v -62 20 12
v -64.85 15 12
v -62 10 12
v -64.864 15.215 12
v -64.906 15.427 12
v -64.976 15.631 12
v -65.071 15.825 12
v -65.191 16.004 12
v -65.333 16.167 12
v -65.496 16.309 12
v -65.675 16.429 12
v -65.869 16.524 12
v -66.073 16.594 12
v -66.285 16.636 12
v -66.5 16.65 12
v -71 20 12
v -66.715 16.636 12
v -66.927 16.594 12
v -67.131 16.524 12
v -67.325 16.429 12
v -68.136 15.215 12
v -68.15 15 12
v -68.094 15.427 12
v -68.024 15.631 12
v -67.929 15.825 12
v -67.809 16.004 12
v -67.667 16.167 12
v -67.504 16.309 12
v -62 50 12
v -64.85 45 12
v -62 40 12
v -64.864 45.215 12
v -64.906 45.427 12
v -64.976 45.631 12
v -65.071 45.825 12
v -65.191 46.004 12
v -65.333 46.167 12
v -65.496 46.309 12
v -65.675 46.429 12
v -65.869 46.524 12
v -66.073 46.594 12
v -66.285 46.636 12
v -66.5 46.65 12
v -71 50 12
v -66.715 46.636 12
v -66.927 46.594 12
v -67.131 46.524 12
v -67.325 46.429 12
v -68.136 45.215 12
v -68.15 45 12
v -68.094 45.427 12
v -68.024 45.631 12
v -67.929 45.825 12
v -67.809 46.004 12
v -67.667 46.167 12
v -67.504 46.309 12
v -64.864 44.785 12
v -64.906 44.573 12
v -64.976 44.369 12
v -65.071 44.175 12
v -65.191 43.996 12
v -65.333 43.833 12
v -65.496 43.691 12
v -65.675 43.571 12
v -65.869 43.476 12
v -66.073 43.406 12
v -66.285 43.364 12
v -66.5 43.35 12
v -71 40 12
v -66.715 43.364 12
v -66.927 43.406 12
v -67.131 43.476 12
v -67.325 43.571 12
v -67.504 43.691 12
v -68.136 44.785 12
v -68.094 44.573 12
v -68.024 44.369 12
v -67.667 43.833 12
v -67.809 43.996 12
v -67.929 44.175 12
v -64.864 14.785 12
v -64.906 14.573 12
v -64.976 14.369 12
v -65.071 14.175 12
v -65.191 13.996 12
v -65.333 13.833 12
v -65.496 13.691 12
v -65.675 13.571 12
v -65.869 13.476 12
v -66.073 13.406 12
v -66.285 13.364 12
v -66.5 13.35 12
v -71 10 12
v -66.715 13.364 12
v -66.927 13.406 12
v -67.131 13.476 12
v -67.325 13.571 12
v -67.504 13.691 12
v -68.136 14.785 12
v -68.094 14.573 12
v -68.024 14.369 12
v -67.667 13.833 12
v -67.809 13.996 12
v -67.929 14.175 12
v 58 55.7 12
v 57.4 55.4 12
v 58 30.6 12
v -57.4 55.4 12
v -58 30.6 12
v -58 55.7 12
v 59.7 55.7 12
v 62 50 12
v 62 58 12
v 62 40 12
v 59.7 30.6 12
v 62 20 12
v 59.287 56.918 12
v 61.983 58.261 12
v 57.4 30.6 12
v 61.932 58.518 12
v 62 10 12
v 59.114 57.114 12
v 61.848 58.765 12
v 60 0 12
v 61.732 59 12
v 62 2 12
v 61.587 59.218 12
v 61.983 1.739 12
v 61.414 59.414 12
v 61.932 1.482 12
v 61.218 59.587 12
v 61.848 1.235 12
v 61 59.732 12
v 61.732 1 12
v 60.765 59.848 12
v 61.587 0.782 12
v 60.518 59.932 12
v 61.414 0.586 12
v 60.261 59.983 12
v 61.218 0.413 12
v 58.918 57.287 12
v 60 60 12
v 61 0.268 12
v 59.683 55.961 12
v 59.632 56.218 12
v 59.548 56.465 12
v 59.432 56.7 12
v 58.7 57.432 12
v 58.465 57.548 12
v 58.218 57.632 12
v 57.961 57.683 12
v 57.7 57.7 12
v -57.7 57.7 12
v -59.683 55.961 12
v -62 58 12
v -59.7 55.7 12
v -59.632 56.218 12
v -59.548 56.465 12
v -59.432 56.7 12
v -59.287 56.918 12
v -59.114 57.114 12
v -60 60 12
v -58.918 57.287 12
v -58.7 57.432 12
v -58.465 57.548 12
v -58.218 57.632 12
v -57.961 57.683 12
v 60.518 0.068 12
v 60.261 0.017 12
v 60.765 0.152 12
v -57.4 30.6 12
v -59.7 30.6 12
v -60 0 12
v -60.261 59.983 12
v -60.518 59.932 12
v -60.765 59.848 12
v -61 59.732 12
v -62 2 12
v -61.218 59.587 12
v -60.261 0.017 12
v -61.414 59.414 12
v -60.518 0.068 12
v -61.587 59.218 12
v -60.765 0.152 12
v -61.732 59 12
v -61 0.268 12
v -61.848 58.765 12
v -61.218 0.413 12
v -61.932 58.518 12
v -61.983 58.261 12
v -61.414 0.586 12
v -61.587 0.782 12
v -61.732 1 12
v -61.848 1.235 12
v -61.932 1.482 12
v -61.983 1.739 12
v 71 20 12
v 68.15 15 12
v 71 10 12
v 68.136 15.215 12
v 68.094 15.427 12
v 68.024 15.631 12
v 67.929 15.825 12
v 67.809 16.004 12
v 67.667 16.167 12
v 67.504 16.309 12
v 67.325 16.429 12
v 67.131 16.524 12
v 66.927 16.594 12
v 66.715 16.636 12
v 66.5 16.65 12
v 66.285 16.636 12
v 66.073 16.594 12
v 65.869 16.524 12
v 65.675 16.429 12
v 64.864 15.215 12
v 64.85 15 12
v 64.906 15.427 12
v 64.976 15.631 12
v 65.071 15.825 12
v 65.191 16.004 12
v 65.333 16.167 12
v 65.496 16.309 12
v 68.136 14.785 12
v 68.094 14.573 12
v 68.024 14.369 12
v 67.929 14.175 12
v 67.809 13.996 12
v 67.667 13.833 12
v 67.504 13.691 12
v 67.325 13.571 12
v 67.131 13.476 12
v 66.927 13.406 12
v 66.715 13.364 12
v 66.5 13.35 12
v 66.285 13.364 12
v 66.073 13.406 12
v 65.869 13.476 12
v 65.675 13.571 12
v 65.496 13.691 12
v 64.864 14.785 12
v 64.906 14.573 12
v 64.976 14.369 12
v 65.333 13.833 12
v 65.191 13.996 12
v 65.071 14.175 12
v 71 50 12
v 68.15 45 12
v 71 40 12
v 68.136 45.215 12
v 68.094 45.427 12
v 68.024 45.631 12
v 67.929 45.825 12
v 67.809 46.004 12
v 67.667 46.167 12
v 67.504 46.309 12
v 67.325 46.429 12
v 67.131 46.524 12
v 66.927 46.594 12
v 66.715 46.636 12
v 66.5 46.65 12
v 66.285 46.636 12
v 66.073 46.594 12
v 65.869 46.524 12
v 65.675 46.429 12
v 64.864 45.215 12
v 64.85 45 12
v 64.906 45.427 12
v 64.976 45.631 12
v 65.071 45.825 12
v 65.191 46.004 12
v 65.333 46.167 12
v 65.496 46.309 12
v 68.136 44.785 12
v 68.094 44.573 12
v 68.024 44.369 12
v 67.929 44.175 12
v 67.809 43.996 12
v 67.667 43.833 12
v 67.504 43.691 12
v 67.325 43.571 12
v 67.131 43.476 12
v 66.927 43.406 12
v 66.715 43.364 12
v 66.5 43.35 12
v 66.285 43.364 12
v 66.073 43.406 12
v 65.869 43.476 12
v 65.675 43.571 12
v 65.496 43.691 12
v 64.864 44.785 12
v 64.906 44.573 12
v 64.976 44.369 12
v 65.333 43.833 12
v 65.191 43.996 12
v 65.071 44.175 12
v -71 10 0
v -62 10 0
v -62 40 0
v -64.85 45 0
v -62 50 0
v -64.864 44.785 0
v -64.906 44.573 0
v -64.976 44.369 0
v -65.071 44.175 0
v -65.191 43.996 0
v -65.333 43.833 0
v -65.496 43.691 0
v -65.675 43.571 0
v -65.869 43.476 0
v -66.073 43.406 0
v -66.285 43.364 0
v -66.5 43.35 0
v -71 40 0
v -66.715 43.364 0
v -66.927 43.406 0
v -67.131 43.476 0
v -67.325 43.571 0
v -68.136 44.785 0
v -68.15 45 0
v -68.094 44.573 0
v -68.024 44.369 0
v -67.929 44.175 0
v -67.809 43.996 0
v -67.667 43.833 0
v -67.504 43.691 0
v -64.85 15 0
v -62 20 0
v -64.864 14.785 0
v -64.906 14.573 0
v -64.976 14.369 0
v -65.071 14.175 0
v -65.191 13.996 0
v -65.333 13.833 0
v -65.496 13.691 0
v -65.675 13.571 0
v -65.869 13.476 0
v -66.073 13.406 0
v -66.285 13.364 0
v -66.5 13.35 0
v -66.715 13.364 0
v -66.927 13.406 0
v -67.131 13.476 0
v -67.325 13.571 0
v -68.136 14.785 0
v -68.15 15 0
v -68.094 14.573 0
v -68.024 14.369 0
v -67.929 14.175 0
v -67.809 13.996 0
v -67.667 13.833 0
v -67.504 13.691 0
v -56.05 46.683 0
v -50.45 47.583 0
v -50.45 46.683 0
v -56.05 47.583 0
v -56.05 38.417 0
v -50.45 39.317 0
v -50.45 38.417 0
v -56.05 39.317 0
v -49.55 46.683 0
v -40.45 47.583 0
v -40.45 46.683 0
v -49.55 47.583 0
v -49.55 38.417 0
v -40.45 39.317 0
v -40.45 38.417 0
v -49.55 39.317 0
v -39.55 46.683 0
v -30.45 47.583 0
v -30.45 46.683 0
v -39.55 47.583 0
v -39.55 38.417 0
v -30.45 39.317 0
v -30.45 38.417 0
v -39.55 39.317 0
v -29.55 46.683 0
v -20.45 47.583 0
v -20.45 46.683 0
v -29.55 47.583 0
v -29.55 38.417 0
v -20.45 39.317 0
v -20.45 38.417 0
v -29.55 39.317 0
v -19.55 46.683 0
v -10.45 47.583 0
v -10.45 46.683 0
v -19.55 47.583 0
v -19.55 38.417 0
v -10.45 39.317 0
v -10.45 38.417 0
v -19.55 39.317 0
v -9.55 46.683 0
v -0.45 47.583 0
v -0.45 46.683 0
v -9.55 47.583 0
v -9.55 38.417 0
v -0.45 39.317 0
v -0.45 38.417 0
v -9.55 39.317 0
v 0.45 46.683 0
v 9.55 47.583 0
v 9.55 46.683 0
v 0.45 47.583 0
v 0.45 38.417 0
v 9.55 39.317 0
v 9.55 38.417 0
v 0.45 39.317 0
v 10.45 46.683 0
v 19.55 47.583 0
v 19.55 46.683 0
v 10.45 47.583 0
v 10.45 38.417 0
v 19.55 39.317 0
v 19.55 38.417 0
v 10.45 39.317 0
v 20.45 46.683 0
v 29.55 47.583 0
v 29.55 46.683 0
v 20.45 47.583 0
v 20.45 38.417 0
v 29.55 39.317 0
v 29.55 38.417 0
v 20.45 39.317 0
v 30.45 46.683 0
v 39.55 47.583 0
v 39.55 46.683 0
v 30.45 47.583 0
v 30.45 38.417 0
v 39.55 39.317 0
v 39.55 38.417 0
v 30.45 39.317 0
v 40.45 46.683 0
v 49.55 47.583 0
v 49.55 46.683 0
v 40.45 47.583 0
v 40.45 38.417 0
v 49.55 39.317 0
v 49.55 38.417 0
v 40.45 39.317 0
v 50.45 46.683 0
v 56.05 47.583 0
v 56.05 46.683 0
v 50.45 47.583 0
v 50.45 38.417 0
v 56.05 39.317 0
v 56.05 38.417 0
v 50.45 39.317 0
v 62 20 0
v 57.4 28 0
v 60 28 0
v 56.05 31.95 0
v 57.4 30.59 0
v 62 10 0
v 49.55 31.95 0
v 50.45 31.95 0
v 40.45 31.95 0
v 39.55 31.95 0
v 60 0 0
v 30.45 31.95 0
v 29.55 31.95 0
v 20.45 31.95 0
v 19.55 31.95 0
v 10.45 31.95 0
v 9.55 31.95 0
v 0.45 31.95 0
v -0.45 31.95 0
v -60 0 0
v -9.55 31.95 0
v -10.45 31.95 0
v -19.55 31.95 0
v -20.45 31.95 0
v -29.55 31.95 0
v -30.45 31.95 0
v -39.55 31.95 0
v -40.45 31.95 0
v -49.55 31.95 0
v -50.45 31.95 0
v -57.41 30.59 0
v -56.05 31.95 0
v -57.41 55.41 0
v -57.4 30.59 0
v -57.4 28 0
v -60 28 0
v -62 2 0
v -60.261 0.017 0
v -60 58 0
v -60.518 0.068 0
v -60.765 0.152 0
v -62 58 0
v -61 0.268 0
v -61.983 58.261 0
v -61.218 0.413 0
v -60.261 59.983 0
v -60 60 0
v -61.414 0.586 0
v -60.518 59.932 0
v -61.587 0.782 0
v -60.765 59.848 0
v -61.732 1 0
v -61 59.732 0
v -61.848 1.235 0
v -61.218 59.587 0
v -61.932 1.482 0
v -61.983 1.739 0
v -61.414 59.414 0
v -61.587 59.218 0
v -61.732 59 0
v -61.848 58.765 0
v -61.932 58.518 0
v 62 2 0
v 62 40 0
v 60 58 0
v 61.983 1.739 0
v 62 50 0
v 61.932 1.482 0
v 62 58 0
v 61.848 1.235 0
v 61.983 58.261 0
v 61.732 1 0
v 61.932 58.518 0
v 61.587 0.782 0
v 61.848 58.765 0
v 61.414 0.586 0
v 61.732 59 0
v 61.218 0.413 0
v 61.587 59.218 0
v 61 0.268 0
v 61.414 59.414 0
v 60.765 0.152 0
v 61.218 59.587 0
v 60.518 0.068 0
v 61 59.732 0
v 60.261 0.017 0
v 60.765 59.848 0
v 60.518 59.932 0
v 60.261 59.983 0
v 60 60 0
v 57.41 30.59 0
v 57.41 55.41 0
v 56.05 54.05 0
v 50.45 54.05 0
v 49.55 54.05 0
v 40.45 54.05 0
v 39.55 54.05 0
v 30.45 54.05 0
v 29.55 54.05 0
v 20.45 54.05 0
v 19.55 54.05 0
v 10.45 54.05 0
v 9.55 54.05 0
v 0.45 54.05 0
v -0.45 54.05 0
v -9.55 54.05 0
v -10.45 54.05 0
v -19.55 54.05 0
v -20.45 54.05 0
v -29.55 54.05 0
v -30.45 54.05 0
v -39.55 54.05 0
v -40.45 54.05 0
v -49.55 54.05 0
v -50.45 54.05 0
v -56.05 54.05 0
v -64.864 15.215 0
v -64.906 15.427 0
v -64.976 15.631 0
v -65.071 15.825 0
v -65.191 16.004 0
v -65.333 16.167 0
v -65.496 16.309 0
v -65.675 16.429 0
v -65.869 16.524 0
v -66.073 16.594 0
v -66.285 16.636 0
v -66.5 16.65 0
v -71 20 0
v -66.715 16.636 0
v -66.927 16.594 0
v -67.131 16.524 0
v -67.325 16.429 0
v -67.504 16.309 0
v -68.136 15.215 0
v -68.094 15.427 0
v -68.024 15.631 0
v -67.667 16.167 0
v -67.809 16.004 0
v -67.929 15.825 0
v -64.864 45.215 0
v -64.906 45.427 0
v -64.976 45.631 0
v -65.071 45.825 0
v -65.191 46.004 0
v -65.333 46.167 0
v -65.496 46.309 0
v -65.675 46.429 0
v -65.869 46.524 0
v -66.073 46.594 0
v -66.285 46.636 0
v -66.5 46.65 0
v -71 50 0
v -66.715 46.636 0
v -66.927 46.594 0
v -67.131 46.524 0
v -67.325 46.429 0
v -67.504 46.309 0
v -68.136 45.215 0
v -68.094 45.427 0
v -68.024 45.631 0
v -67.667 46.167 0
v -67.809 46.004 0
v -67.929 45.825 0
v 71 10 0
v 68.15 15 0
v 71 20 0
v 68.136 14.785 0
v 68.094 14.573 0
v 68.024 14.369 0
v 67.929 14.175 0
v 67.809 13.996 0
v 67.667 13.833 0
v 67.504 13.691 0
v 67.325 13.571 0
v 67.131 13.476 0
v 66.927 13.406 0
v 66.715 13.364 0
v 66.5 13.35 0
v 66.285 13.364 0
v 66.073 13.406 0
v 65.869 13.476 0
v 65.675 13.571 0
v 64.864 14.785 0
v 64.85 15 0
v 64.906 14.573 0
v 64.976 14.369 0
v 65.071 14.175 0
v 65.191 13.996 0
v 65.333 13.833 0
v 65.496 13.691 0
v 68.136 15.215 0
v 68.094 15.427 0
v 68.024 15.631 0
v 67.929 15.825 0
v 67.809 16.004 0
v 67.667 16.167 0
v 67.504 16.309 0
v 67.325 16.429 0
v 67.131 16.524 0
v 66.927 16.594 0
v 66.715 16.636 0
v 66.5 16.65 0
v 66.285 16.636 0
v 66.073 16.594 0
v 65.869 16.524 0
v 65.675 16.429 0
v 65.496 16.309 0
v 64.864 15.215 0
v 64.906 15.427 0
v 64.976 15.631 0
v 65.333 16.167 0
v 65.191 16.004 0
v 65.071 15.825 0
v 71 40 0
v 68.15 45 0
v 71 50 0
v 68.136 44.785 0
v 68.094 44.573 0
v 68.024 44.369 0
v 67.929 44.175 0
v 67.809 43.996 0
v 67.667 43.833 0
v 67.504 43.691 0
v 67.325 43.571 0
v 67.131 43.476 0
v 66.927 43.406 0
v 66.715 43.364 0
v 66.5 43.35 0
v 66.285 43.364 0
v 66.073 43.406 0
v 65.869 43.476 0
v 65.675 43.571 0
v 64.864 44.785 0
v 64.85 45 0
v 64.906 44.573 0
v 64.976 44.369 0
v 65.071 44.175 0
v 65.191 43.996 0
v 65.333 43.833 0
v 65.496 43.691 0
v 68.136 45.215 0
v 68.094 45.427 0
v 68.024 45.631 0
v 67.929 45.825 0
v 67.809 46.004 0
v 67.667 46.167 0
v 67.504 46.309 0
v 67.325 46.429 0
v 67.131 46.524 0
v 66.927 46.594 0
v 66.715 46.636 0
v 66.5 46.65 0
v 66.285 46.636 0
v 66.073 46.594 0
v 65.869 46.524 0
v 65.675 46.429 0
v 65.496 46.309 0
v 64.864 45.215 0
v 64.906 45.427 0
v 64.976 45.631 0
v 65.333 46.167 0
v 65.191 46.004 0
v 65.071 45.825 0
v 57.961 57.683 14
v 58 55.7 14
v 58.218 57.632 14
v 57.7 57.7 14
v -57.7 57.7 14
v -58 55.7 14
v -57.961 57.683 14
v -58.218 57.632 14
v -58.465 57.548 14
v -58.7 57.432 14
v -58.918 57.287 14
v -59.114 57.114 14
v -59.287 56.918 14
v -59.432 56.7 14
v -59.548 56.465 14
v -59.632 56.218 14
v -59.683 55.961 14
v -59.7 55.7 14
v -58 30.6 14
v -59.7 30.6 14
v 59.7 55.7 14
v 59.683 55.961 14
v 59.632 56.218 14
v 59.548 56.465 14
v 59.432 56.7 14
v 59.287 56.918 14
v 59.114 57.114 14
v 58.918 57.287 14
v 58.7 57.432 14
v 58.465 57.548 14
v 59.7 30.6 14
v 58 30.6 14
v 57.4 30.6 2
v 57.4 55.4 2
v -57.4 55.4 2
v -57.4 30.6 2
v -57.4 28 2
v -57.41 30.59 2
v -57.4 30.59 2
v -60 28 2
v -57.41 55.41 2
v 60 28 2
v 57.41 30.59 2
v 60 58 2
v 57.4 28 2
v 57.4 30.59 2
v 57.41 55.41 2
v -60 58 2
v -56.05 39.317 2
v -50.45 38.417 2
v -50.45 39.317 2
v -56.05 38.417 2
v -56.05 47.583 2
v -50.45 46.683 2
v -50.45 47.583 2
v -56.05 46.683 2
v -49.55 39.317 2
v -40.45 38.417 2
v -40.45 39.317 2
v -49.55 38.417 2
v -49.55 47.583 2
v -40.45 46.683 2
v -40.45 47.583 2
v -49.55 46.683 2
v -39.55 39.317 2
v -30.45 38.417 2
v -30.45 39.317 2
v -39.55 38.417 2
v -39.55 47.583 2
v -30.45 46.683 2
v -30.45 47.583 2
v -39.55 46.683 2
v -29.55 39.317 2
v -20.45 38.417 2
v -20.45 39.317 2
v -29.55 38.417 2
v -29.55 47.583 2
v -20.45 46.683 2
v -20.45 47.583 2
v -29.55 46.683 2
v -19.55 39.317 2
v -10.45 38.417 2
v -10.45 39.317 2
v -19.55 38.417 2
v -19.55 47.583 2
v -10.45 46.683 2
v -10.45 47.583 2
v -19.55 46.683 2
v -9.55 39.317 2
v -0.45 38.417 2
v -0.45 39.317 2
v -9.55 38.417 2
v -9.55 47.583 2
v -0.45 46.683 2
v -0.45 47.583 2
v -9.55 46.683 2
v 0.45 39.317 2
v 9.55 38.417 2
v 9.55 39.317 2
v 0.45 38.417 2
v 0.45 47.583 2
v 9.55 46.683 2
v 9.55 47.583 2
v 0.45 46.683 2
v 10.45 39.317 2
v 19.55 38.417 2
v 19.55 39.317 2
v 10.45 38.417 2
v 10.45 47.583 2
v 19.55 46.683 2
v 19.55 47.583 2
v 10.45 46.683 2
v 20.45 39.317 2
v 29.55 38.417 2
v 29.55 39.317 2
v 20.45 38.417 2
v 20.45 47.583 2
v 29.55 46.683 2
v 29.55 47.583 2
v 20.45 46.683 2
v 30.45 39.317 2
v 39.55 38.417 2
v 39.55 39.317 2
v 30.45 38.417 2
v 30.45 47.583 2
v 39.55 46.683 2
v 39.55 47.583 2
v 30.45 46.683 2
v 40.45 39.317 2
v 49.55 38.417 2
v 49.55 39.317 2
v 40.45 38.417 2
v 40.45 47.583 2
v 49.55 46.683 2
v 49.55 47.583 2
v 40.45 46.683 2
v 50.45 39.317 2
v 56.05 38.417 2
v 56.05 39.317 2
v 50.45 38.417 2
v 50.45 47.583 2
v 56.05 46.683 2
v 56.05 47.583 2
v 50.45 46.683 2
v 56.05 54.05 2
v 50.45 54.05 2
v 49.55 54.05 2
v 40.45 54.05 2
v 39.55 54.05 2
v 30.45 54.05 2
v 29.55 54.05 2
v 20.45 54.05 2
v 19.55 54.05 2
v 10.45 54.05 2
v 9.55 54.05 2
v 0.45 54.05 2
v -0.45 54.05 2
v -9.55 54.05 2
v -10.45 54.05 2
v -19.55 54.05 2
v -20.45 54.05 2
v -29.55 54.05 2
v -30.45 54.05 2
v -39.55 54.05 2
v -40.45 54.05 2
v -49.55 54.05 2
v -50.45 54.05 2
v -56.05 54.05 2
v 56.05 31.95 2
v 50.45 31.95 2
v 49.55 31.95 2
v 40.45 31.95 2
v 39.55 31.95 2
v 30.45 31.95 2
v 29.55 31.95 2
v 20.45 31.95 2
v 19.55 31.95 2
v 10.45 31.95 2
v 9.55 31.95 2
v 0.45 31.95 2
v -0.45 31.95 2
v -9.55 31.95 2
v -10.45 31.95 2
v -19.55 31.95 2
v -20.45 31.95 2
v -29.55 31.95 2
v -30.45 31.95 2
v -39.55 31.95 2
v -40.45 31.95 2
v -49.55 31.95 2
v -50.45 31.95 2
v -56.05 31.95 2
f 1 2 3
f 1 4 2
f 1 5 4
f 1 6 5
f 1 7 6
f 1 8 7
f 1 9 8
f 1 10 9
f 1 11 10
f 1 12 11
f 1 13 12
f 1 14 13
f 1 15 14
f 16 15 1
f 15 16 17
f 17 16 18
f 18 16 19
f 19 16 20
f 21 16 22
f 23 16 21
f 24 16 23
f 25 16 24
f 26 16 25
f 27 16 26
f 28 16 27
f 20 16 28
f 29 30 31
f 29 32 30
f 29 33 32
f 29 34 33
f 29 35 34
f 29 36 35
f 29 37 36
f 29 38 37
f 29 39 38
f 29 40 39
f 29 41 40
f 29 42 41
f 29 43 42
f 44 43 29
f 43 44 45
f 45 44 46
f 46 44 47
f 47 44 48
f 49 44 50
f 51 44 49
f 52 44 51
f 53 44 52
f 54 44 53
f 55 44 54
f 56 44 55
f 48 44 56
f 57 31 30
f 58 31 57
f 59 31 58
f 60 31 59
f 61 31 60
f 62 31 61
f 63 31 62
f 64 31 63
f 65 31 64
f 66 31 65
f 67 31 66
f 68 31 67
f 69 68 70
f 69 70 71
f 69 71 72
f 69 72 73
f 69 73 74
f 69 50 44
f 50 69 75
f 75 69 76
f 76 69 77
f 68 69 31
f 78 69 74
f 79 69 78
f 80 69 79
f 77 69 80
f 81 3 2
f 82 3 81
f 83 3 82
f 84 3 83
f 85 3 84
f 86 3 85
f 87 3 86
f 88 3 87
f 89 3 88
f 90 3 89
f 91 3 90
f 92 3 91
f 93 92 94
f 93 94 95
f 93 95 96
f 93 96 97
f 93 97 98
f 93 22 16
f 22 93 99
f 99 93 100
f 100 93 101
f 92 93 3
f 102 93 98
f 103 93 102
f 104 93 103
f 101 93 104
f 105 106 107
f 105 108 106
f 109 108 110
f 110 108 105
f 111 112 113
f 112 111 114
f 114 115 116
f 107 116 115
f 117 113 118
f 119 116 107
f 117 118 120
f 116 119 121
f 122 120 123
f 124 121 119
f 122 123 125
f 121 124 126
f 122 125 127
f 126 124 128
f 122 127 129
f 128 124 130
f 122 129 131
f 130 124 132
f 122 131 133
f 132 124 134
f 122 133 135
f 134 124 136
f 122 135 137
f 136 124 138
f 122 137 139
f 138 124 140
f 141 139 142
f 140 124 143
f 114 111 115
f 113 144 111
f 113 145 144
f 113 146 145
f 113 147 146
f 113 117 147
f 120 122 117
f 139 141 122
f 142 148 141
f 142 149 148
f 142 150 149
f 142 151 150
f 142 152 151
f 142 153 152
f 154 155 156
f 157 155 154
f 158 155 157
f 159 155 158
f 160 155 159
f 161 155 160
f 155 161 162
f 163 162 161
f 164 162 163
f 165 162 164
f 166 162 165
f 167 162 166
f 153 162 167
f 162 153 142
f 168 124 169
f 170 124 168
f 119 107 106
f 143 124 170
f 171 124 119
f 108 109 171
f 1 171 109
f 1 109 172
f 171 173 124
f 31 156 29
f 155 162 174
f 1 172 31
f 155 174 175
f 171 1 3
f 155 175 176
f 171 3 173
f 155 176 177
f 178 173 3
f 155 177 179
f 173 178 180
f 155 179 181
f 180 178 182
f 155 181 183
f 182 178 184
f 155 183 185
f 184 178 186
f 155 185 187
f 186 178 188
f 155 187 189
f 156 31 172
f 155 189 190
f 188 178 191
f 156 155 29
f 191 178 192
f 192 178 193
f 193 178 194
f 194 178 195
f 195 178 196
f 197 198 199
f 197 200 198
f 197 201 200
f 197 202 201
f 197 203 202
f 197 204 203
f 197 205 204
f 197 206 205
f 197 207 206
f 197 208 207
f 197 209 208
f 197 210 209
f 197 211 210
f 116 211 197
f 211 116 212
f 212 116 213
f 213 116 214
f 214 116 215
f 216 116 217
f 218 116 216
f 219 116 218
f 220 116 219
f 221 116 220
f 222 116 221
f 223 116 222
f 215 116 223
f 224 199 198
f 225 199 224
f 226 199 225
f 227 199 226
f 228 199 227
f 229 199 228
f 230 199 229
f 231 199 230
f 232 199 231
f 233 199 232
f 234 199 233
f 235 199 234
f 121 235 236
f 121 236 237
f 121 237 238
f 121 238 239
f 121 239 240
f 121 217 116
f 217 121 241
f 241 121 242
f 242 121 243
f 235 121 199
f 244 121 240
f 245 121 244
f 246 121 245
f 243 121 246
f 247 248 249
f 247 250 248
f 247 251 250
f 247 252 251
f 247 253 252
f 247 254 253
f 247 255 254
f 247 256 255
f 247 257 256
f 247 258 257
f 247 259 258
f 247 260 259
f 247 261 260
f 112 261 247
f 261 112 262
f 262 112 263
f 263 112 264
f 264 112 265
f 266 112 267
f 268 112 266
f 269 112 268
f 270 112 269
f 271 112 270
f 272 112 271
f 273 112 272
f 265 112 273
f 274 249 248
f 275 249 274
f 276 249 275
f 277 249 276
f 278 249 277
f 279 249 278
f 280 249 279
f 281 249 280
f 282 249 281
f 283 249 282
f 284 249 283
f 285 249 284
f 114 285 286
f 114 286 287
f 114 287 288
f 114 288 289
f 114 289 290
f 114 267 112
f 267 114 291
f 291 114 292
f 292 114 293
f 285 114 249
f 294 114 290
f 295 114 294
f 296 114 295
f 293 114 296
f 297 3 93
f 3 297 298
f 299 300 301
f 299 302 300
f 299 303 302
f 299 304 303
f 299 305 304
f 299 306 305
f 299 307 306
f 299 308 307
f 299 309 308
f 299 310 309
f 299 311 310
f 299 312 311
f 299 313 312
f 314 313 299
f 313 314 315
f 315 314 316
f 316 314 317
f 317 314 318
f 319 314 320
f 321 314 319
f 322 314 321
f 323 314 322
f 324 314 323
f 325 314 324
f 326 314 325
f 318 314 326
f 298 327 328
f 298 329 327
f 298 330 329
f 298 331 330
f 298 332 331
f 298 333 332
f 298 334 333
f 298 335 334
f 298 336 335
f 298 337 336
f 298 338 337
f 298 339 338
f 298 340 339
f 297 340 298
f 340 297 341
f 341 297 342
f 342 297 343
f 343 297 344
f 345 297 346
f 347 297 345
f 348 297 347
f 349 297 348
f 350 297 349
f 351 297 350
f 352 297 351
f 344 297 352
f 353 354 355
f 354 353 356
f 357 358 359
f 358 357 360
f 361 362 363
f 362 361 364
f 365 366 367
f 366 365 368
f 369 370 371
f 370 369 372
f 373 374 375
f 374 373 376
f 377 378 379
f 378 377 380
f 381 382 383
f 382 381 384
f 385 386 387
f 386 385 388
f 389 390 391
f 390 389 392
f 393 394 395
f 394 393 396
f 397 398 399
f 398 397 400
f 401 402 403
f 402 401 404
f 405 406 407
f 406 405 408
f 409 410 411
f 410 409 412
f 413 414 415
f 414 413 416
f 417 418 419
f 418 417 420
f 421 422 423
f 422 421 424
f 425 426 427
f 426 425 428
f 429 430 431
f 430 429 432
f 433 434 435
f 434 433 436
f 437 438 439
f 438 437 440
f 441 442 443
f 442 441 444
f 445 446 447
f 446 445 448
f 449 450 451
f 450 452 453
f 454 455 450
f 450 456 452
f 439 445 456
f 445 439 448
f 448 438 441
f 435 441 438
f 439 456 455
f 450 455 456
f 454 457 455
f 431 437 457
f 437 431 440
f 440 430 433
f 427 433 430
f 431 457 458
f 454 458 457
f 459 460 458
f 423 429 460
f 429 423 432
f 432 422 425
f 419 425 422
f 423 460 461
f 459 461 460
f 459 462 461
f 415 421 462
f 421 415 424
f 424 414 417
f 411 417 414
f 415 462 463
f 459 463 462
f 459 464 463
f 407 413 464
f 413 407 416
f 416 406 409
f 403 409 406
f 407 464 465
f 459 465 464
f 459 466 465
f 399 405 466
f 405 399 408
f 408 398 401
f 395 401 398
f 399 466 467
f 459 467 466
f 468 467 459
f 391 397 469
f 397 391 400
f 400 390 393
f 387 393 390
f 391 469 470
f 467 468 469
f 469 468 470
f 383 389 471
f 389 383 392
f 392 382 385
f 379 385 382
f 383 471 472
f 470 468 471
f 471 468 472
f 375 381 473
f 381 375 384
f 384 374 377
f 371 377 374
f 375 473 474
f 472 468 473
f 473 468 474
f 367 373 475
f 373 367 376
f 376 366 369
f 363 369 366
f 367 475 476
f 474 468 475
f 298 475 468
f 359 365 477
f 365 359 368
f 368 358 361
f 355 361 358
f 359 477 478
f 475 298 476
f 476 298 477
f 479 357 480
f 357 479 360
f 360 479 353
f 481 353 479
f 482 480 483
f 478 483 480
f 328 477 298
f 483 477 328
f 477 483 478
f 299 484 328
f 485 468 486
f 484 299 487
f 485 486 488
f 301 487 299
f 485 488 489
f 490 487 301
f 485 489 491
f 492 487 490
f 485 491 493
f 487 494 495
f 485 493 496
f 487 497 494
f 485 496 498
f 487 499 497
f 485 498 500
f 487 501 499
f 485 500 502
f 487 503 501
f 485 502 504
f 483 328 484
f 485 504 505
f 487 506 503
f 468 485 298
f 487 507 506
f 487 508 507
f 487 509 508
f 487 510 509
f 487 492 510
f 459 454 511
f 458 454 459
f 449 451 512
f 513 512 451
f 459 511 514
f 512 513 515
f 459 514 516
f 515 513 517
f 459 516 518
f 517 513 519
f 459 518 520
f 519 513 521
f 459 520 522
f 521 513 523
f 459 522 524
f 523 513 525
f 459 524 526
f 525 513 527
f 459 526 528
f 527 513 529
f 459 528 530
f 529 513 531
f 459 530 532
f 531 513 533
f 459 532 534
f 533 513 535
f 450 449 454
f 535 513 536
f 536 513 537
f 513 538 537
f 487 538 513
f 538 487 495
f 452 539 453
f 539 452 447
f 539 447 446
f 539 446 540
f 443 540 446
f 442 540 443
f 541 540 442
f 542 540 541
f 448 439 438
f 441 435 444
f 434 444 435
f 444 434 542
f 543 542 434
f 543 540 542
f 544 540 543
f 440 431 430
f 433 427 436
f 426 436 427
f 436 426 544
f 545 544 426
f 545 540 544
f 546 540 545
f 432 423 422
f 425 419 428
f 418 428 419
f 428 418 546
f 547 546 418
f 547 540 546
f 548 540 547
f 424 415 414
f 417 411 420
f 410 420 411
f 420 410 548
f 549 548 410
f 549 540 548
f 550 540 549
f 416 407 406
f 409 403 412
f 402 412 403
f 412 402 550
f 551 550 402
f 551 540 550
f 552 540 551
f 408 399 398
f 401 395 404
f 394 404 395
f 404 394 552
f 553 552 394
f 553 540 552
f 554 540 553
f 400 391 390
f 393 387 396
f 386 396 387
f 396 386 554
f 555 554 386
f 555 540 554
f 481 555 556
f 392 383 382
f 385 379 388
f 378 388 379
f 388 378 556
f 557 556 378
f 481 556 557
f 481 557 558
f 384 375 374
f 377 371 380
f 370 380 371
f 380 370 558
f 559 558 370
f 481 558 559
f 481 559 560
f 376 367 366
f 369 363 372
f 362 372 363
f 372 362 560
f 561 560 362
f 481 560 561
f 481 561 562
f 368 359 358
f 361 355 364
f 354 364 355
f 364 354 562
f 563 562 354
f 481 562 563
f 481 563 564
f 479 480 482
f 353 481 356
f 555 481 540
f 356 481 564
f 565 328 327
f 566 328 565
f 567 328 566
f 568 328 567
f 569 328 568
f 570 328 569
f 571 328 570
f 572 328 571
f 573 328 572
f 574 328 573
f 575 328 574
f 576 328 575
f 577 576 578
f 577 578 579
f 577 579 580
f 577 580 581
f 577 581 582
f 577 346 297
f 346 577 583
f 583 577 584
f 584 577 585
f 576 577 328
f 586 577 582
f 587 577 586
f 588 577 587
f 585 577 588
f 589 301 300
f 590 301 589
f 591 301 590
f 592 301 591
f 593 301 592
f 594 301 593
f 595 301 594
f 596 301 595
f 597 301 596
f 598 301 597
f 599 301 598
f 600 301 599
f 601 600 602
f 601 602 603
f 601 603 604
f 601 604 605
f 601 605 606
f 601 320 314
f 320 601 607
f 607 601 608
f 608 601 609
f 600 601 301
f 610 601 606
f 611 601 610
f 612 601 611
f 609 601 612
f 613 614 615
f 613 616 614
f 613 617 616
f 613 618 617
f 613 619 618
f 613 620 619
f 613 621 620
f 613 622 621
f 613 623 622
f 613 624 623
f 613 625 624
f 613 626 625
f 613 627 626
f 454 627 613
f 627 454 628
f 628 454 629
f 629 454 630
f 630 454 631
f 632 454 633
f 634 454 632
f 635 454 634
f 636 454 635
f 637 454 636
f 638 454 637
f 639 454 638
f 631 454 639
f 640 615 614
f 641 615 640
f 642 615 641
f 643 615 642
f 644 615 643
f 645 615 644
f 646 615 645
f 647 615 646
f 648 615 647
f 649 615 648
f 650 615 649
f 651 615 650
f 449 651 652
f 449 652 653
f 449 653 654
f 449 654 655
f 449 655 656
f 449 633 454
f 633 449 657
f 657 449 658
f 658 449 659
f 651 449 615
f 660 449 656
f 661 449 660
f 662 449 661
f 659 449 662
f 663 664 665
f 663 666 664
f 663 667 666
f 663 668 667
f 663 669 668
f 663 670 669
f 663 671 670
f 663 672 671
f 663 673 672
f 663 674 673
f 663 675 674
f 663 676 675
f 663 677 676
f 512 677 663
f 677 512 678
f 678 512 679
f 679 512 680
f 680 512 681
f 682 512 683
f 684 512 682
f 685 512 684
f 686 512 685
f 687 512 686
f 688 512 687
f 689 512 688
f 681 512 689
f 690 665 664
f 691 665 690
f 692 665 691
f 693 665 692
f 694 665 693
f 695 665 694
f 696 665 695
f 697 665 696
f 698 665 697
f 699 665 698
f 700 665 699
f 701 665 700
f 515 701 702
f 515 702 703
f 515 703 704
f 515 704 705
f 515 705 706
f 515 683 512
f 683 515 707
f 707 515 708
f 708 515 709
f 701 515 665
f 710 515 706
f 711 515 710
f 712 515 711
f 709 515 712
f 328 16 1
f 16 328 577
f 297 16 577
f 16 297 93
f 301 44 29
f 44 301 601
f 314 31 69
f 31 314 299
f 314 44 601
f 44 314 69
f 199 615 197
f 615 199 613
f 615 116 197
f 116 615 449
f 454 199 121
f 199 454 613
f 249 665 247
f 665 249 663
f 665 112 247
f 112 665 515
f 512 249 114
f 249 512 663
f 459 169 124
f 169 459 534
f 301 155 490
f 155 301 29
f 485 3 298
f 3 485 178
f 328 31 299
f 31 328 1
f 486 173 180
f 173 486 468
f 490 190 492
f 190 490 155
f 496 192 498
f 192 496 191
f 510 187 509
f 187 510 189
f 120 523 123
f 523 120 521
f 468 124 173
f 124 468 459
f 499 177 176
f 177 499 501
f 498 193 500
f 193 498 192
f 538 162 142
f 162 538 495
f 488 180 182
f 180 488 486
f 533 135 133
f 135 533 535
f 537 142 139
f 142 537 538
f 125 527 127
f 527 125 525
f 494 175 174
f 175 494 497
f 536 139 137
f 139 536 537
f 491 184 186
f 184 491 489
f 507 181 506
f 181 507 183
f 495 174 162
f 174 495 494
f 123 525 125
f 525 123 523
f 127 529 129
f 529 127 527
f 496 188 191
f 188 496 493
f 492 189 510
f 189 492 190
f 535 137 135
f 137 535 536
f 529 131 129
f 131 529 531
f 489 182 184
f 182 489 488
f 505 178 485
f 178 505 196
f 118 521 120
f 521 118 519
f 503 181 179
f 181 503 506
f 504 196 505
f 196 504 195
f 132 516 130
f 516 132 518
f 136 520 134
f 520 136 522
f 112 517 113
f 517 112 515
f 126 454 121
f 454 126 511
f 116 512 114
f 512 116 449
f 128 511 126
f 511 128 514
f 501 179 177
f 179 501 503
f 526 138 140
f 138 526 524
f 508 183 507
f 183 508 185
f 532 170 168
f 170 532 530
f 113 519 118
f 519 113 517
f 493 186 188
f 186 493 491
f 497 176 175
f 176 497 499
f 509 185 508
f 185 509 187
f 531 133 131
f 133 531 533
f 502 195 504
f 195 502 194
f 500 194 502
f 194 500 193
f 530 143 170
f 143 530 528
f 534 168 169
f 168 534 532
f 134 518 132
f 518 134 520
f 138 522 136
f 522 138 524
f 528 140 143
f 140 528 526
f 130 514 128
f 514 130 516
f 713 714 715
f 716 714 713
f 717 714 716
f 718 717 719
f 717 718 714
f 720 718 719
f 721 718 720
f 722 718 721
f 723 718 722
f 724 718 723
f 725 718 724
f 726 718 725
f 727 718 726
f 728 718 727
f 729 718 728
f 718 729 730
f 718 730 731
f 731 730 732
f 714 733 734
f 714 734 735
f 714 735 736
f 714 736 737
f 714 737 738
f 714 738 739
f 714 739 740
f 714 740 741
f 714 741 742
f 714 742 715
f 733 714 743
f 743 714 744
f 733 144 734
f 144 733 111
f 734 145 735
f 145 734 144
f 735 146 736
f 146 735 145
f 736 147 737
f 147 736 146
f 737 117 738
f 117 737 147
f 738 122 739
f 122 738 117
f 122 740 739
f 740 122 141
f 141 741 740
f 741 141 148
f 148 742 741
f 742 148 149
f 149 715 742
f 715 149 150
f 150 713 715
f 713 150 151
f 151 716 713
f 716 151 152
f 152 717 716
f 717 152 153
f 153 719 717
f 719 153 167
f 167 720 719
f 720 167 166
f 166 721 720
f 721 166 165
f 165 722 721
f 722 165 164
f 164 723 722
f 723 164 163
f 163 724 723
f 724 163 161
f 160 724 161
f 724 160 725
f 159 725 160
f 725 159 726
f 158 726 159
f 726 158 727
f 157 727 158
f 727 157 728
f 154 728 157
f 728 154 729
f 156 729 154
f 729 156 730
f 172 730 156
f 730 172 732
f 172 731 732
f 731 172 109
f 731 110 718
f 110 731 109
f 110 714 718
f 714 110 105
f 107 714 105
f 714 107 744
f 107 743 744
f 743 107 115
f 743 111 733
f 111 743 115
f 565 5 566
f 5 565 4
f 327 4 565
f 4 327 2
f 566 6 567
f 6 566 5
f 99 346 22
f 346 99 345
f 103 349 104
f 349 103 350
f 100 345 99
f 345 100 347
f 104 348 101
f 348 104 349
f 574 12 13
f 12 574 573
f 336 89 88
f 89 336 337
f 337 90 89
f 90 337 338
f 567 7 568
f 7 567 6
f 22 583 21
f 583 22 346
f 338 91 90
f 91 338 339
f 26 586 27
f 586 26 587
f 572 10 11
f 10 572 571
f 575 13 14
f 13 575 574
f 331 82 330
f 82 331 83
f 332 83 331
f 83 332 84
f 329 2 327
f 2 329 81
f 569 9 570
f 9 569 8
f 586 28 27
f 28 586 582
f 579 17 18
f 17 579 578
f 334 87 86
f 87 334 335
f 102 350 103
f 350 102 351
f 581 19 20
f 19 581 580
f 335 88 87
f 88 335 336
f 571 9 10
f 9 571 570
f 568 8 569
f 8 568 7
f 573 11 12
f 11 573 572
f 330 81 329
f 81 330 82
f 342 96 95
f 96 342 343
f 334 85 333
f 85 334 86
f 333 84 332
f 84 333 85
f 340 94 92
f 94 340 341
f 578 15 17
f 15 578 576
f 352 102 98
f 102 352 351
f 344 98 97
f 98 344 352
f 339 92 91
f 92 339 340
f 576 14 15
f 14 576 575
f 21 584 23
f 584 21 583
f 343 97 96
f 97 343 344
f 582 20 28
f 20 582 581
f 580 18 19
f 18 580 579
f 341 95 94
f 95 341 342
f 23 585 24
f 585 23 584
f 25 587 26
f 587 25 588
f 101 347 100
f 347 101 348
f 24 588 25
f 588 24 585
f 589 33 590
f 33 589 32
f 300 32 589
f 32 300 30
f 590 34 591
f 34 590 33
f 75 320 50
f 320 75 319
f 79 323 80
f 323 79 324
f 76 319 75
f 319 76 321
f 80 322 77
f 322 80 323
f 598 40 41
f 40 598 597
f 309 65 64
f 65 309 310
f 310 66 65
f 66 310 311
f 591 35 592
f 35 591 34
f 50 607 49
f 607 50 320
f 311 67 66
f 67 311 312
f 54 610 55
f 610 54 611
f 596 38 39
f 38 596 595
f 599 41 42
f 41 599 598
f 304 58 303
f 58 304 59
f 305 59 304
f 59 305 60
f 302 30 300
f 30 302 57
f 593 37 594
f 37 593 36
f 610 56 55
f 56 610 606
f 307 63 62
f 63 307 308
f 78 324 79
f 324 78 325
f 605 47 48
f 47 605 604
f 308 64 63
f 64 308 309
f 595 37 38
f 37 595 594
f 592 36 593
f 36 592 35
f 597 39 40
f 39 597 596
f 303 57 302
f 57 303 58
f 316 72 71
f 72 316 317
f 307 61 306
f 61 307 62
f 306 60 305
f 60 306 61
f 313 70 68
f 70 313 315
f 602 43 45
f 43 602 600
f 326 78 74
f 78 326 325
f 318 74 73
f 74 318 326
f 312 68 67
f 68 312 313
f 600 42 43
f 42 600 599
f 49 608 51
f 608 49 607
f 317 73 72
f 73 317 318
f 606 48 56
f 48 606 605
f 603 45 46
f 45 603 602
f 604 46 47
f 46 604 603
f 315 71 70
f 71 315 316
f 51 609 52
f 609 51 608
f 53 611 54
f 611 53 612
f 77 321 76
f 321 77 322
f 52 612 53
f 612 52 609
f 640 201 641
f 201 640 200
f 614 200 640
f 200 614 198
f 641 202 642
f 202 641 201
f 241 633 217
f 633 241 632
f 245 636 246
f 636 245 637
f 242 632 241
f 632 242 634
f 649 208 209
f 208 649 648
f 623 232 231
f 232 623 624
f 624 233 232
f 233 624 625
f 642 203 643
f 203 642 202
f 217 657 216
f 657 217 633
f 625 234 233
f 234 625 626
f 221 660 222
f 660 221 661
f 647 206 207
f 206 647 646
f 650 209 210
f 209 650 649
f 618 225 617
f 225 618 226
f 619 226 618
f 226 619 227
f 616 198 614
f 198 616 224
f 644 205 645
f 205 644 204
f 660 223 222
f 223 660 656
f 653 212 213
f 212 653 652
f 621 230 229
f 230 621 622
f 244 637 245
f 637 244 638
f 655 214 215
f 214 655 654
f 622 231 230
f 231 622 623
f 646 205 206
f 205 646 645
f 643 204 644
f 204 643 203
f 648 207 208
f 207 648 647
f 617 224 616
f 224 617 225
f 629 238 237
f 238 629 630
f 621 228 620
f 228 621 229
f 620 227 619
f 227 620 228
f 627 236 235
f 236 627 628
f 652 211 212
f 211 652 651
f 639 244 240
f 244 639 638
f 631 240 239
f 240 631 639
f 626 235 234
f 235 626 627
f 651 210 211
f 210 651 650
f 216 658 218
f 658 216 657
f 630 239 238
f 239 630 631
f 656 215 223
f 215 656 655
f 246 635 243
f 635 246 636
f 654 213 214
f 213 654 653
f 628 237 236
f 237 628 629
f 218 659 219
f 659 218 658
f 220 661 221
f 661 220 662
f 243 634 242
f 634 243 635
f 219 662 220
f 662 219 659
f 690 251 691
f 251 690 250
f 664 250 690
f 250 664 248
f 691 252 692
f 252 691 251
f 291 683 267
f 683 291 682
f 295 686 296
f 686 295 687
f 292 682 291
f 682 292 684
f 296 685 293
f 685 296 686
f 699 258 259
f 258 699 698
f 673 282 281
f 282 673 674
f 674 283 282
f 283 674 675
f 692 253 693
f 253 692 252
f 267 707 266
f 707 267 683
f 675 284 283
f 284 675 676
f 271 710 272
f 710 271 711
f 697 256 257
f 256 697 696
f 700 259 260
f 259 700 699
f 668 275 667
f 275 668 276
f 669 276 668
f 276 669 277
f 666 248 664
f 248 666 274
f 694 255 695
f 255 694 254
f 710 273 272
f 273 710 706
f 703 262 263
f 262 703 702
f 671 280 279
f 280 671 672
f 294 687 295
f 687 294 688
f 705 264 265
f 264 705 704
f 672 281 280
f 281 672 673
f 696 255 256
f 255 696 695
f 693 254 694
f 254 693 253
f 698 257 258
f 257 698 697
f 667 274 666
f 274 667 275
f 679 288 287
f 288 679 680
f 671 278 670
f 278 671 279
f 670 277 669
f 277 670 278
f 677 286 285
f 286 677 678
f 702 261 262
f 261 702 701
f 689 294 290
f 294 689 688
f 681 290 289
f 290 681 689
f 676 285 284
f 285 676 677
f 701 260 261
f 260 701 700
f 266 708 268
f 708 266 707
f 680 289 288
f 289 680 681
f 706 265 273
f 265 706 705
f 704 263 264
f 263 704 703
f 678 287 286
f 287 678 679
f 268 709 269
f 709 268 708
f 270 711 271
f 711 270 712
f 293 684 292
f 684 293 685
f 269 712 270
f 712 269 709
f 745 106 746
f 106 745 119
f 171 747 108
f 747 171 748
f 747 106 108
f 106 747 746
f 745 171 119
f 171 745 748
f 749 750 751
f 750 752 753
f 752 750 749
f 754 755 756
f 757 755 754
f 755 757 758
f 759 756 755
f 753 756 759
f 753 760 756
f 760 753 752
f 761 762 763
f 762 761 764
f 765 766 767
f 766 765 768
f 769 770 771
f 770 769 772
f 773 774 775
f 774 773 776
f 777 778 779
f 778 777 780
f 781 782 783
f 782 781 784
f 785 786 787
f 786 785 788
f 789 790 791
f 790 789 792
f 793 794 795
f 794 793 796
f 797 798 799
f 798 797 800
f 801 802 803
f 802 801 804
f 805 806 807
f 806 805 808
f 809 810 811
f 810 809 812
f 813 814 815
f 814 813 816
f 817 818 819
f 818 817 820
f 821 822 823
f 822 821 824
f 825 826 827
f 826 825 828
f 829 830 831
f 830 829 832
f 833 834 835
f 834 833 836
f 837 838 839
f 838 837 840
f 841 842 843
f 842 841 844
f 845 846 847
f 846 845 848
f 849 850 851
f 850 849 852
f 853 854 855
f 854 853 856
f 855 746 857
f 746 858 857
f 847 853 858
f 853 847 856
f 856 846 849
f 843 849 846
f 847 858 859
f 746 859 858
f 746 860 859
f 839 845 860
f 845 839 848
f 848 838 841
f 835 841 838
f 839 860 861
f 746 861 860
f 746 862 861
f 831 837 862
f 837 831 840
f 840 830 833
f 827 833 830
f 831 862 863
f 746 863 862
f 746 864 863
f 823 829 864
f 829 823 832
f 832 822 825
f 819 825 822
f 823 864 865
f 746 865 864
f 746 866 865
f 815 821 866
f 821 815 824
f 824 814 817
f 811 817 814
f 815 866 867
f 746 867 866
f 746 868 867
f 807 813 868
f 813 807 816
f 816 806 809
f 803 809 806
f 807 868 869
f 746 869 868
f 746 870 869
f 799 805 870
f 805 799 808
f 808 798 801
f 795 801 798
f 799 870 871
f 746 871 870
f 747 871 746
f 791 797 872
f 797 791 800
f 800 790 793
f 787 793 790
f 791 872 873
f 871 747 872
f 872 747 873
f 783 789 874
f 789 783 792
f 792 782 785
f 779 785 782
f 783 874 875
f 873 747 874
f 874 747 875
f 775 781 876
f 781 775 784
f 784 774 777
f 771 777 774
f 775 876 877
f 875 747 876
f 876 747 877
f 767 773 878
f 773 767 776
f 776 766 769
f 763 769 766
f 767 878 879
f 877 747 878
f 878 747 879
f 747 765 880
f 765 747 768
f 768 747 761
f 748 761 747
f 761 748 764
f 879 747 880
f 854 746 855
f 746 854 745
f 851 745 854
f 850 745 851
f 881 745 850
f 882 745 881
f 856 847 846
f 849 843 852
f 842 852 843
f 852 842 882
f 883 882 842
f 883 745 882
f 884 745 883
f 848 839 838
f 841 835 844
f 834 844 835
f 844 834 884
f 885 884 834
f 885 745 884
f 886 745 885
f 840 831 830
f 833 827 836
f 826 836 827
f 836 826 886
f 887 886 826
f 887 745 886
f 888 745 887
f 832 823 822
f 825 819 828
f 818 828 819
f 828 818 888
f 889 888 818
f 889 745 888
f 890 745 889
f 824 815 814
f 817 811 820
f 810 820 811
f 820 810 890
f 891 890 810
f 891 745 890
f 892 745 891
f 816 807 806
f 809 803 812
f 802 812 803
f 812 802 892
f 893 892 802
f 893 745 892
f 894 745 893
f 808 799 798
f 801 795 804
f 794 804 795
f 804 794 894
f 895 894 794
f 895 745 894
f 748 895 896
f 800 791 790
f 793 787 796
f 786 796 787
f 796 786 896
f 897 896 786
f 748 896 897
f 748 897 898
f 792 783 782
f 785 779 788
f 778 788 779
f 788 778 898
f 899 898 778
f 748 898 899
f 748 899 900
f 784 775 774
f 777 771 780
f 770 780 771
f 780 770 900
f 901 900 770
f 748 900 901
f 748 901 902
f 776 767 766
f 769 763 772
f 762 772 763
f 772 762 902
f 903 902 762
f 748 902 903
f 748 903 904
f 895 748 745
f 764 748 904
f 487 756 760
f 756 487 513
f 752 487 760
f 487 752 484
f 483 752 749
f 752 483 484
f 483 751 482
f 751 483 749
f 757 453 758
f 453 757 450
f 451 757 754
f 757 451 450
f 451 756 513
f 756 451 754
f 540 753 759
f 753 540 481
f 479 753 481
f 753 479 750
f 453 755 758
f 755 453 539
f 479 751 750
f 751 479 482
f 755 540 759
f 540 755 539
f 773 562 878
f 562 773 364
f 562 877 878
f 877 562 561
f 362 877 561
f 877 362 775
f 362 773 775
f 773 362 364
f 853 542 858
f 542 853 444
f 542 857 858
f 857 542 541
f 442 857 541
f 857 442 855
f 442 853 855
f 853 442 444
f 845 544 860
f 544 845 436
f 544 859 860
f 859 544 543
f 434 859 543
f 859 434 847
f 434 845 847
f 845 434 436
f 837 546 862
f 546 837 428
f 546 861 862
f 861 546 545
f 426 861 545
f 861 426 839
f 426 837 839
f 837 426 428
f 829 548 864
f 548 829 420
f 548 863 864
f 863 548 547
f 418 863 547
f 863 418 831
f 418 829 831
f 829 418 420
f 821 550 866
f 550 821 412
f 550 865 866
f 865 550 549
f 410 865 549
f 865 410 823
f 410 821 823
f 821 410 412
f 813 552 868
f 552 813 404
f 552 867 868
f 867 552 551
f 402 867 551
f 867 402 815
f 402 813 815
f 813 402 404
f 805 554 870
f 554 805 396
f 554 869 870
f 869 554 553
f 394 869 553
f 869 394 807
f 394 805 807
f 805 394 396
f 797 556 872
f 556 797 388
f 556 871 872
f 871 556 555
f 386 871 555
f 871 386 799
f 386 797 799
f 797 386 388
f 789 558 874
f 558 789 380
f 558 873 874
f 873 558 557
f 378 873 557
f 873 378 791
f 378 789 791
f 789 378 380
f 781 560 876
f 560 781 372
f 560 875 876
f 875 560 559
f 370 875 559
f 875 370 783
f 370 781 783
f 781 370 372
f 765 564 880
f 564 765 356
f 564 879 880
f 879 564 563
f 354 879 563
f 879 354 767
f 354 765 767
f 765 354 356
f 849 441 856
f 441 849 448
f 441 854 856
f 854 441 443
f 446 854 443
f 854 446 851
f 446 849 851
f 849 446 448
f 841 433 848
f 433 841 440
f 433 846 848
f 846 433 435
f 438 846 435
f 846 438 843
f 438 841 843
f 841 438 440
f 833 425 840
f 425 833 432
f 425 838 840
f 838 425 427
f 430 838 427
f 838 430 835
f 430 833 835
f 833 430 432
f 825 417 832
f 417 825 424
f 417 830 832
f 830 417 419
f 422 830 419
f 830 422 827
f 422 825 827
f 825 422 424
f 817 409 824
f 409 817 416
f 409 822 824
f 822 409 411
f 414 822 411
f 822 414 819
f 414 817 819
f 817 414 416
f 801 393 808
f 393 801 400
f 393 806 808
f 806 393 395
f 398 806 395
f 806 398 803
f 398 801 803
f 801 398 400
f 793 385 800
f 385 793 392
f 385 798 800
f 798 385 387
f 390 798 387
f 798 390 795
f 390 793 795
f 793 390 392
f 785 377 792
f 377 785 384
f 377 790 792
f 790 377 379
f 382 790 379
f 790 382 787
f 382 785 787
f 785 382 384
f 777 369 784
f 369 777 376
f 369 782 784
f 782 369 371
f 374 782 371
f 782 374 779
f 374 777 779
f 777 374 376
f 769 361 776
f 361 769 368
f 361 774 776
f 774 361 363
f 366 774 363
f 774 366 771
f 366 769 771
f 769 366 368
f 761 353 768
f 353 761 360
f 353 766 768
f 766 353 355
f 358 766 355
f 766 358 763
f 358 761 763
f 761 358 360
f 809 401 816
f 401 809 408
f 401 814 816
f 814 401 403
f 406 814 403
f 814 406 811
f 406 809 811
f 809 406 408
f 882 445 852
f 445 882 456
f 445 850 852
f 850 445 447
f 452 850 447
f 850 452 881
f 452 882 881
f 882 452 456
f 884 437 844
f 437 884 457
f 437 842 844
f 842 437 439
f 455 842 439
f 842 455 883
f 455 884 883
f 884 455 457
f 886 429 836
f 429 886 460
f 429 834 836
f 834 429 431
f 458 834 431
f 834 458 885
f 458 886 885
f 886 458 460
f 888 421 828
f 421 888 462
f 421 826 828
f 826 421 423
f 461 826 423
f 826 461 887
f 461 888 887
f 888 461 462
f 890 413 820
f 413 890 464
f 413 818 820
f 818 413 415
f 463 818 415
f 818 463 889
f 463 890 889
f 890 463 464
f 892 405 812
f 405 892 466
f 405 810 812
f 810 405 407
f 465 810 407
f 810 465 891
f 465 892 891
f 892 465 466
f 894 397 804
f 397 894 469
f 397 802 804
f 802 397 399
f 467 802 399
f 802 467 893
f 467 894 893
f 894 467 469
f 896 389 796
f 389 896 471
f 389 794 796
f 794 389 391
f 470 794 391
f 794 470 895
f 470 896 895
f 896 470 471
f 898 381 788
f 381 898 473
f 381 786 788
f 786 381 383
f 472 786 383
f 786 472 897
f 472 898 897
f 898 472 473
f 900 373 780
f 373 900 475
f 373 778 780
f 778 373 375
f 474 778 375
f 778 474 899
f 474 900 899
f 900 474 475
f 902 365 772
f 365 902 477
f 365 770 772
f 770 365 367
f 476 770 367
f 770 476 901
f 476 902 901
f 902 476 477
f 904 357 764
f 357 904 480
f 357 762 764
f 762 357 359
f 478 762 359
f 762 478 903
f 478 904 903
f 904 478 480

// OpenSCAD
// file: lunchbox.params.scad
// SPDX-FileCopyrightText: 2026 Alon A. Rabinowitz
// SPDX-License-Identifier: CC-BY-SA-4.0
// A remix of LunchBox by GekoPrime (https://www.printables.com/model/468166), CC BY-SA 4.0.

/*
Everything you SET for the LunchBox remix. Render lunchbox.scad, not this file.

The LunchBox is a carbon + HEPA scrubber. Air enters the grid on the body's front and passes the HEPA paper,
then the carbon bed between two perforated walls. It goes down a channel at the back to the fan section
underneath, whose fans blow it out at the front. This remix adds, for a build with two 40 x 40 x 20 fans
(Delta EFB0412VHD):

  insert      a drop-in section between the body and the fan section, holding a flat filter sheet that
              stops carbon dust reaching the fans. It mates with the unmodified parts on both faces.
  gaskets     flat TPU, one for the lid joint and one for each joint at the fans.
  blank       closes the fan section's middle bay.
  tabs        two per short end at every joint, clamped with an M3 screw and a nut in a side slot. The
              body, the lid and the fan section get them added to the original STLs.

COORDINATES are the box as it stands: X along its length, Y from the front (the grid, where air comes in)
to the back, Z up, with Z = 0 at the joint between the body and the fan section. X is centred.

The original's STLs use a different frame (Z points down, Y from the front towards -Y) and are not in
this repository; lunchbox.layout.scad maps them into this one. Download them from the Printables page into
original/ - see the README there.
*/

/* [Which part] */
part = "insert";   /* "insert", "gasket-lid", "gasket-fans", "blank", "body", "lid" or "fans". The last three are the originals with tabs added, and need original/. lunchbox-assembly.scad shows them together. */
insert_tabs = true;   /* false makes the insert a plain drop-in, for a LunchBox built without tabs. */
/* [The original LunchBox - measured by sectioning its STLs, 6-7 Oct 2026] */
// All MEASURED: horizontal sections of filter_caddy_110x74x21.stl (the body), filter_lid_110x74x21.stl and
// axial_fan_caddy_40x28.stl (the fan section), read to 0.1 mm. The originals agree with each other to that
// precision (the outlines are identical), so the numbers are the author's design values.
lb_l    = 124;      /* Outside length (X). */
lb_d    = 60;       /* Outside depth (Y). */
lb_r    = 2;        /* The outline's corner radius. */
lb_wall = 2;        /* The body's wall; the lid's plug fills the inside of it, 120 x 56. */
body_h  = 117.43;   /* The body, from the fan joint to the lid joint. */
lid_t   = 2;        /* The lid's plate. Its plug, lid_t more, sits inside the body's top. */
lid_screw_ys = [5, 55];   /* The lid's own two screws, at X = 0. They stay. */
groove_w = 2.6;     /* The channel in the body's bottom face, inside its wall, that the fan section's lip seats in... */
groove_h = 2;       /* ...and its depth. */
hepa_hw  = 55;      /* The HEPA holder's opening in the body's bottom face: X +/-55, from the wall to Y = hepa_y1. */
hepa_y1  = 23;
cap_y1   = 41.1;    /* The carbon bed's floor, at the body's bottom face, ends here; behind it is the channel that takes the air down to the fans. */
fans_h   = 44.6;    /* The fan section, from its bottom to the rim the body sits on. Its lip stands groove_h higher. */
fans_floor = 4;     /* The fan section's floor, under the fans. */
fan_slot_hw = 60.3; /* The slot the three fans stand in, side by side: X +/-60.3 ... */
fan_slot_y1 = 30.6; /* ...from the front wall (Y = lb_wall) to here, where the walls step in. Behind it, the plenum with its curved floor. */
plenum_hw   = 58;   /* The plenum's opening in the rim, X +/-58, from fan_slot_y1 to lip_back_y0. */
lip_t_side  = 1.7;  /* The fan section's lip: along each side, X 58 to 59.7, from fan_slot_y1 back... */
lip_back_y0 = 55.7; /* ...and across the back, Y 55.7 to 57.7, its two outer corners rounded to lb_r. It rises groove_h above the rim. */
lip_t_back  = 2;

/* [The insert and its filter sheet] */
sheet_t  = 5;       /* The space the sheet lies in. Polyester filter floss, about 5 mm loose; it is not compressed. */
plenum_h = 5;       /* Free air above the sheet: the channel is only 14 mm deep, and this lets its air spread forward over the whole sheet. */
grid_t   = 2;       /* The grid the sheet lies on. */
grid_pitch = 10;    /* Ribs along Y, this far apart; two more ribs cross them along X. */
grid_beads = 2;     /* Each rib is this many beads wide. */
ledge_beads = 3;    /* A ledge round the cavity at the grid's level: the ribs end on it, and the sheet's edges seal on it. */

/* [The gaskets - TPU] */
gasket_t = 1.0;     /* Five layers. Every joint's stack height counts it, uncompressed. */

/* [The tabs and their screws] */
tab_ys    = [15, 45];   /* The two tabs on each short end, by Y. Alon, Q81, 7 Oct 2026: two per side. */
tab_l     = 9;      /* How far a tab stands out from the end wall. */
tab_w     = 10;     /* Its width, along Y. */
tab_t     = 6;      /* Its height, on the body and the fan section. The lid's tab is the lid's plate. */
tab_axis  = 4.5;    /* The screw, this far out from the end wall: the nut's slot then stops about 1 mm short of it. */
screw_d   = 3.0;    /* M3. */
nut_af    = 5.5;    /* The M3 hex nut, across its flats - ISO 4032... */
nut_h     = 2.4;    /* ...and its height, the largest allowed. */
nut_fit   = 0.15;   /* The nut's side slot, per side, on top of fdm_hole_comp: the nut slides in and the screw holds it. */
screw_tip = 1.5;    /* A screw must stand this far out of its nut. */
screw_lengths = [8, 10, 12, 16, 20, 25, 30, 35, 40];   /* M3 lengths to choose from. */

/* [The blank for the middle bay] */
blank_fit = 0.2;    /* Less than the bay, per side, in X and in depth. The fans beside it are 40 mm on the nose. */
blank_face = 2;     /* Its front face, which closes the bay. */
blank_beads = 3;    /* Its side walls. */

/* [Printing - mirrors the print profile; scad-check.sh compares the first two with the slicer's] */
fdm_layer_h     = 0.2;
fdm_extrusion_w = 0.45;
fdm_hole_comp   = 0.15;   /* Added to every hole's radius - fdm-design-rules section 2. Not cross-checked. */
// main file
// SPDX-FileCopyrightText: 2026 Alon A. Rabinowitz
// SPDX-License-Identifier: CC-BY-SA-4.0
// A remix of LunchBox by GekoPrime (https://www.printables.com/model/468166), CC BY-SA 4.0.

// The insert with its tabs, on its own: everything is in lunchbox.scad, and this file only pins the part.
include <lunchbox.scad>
part = "insert";
